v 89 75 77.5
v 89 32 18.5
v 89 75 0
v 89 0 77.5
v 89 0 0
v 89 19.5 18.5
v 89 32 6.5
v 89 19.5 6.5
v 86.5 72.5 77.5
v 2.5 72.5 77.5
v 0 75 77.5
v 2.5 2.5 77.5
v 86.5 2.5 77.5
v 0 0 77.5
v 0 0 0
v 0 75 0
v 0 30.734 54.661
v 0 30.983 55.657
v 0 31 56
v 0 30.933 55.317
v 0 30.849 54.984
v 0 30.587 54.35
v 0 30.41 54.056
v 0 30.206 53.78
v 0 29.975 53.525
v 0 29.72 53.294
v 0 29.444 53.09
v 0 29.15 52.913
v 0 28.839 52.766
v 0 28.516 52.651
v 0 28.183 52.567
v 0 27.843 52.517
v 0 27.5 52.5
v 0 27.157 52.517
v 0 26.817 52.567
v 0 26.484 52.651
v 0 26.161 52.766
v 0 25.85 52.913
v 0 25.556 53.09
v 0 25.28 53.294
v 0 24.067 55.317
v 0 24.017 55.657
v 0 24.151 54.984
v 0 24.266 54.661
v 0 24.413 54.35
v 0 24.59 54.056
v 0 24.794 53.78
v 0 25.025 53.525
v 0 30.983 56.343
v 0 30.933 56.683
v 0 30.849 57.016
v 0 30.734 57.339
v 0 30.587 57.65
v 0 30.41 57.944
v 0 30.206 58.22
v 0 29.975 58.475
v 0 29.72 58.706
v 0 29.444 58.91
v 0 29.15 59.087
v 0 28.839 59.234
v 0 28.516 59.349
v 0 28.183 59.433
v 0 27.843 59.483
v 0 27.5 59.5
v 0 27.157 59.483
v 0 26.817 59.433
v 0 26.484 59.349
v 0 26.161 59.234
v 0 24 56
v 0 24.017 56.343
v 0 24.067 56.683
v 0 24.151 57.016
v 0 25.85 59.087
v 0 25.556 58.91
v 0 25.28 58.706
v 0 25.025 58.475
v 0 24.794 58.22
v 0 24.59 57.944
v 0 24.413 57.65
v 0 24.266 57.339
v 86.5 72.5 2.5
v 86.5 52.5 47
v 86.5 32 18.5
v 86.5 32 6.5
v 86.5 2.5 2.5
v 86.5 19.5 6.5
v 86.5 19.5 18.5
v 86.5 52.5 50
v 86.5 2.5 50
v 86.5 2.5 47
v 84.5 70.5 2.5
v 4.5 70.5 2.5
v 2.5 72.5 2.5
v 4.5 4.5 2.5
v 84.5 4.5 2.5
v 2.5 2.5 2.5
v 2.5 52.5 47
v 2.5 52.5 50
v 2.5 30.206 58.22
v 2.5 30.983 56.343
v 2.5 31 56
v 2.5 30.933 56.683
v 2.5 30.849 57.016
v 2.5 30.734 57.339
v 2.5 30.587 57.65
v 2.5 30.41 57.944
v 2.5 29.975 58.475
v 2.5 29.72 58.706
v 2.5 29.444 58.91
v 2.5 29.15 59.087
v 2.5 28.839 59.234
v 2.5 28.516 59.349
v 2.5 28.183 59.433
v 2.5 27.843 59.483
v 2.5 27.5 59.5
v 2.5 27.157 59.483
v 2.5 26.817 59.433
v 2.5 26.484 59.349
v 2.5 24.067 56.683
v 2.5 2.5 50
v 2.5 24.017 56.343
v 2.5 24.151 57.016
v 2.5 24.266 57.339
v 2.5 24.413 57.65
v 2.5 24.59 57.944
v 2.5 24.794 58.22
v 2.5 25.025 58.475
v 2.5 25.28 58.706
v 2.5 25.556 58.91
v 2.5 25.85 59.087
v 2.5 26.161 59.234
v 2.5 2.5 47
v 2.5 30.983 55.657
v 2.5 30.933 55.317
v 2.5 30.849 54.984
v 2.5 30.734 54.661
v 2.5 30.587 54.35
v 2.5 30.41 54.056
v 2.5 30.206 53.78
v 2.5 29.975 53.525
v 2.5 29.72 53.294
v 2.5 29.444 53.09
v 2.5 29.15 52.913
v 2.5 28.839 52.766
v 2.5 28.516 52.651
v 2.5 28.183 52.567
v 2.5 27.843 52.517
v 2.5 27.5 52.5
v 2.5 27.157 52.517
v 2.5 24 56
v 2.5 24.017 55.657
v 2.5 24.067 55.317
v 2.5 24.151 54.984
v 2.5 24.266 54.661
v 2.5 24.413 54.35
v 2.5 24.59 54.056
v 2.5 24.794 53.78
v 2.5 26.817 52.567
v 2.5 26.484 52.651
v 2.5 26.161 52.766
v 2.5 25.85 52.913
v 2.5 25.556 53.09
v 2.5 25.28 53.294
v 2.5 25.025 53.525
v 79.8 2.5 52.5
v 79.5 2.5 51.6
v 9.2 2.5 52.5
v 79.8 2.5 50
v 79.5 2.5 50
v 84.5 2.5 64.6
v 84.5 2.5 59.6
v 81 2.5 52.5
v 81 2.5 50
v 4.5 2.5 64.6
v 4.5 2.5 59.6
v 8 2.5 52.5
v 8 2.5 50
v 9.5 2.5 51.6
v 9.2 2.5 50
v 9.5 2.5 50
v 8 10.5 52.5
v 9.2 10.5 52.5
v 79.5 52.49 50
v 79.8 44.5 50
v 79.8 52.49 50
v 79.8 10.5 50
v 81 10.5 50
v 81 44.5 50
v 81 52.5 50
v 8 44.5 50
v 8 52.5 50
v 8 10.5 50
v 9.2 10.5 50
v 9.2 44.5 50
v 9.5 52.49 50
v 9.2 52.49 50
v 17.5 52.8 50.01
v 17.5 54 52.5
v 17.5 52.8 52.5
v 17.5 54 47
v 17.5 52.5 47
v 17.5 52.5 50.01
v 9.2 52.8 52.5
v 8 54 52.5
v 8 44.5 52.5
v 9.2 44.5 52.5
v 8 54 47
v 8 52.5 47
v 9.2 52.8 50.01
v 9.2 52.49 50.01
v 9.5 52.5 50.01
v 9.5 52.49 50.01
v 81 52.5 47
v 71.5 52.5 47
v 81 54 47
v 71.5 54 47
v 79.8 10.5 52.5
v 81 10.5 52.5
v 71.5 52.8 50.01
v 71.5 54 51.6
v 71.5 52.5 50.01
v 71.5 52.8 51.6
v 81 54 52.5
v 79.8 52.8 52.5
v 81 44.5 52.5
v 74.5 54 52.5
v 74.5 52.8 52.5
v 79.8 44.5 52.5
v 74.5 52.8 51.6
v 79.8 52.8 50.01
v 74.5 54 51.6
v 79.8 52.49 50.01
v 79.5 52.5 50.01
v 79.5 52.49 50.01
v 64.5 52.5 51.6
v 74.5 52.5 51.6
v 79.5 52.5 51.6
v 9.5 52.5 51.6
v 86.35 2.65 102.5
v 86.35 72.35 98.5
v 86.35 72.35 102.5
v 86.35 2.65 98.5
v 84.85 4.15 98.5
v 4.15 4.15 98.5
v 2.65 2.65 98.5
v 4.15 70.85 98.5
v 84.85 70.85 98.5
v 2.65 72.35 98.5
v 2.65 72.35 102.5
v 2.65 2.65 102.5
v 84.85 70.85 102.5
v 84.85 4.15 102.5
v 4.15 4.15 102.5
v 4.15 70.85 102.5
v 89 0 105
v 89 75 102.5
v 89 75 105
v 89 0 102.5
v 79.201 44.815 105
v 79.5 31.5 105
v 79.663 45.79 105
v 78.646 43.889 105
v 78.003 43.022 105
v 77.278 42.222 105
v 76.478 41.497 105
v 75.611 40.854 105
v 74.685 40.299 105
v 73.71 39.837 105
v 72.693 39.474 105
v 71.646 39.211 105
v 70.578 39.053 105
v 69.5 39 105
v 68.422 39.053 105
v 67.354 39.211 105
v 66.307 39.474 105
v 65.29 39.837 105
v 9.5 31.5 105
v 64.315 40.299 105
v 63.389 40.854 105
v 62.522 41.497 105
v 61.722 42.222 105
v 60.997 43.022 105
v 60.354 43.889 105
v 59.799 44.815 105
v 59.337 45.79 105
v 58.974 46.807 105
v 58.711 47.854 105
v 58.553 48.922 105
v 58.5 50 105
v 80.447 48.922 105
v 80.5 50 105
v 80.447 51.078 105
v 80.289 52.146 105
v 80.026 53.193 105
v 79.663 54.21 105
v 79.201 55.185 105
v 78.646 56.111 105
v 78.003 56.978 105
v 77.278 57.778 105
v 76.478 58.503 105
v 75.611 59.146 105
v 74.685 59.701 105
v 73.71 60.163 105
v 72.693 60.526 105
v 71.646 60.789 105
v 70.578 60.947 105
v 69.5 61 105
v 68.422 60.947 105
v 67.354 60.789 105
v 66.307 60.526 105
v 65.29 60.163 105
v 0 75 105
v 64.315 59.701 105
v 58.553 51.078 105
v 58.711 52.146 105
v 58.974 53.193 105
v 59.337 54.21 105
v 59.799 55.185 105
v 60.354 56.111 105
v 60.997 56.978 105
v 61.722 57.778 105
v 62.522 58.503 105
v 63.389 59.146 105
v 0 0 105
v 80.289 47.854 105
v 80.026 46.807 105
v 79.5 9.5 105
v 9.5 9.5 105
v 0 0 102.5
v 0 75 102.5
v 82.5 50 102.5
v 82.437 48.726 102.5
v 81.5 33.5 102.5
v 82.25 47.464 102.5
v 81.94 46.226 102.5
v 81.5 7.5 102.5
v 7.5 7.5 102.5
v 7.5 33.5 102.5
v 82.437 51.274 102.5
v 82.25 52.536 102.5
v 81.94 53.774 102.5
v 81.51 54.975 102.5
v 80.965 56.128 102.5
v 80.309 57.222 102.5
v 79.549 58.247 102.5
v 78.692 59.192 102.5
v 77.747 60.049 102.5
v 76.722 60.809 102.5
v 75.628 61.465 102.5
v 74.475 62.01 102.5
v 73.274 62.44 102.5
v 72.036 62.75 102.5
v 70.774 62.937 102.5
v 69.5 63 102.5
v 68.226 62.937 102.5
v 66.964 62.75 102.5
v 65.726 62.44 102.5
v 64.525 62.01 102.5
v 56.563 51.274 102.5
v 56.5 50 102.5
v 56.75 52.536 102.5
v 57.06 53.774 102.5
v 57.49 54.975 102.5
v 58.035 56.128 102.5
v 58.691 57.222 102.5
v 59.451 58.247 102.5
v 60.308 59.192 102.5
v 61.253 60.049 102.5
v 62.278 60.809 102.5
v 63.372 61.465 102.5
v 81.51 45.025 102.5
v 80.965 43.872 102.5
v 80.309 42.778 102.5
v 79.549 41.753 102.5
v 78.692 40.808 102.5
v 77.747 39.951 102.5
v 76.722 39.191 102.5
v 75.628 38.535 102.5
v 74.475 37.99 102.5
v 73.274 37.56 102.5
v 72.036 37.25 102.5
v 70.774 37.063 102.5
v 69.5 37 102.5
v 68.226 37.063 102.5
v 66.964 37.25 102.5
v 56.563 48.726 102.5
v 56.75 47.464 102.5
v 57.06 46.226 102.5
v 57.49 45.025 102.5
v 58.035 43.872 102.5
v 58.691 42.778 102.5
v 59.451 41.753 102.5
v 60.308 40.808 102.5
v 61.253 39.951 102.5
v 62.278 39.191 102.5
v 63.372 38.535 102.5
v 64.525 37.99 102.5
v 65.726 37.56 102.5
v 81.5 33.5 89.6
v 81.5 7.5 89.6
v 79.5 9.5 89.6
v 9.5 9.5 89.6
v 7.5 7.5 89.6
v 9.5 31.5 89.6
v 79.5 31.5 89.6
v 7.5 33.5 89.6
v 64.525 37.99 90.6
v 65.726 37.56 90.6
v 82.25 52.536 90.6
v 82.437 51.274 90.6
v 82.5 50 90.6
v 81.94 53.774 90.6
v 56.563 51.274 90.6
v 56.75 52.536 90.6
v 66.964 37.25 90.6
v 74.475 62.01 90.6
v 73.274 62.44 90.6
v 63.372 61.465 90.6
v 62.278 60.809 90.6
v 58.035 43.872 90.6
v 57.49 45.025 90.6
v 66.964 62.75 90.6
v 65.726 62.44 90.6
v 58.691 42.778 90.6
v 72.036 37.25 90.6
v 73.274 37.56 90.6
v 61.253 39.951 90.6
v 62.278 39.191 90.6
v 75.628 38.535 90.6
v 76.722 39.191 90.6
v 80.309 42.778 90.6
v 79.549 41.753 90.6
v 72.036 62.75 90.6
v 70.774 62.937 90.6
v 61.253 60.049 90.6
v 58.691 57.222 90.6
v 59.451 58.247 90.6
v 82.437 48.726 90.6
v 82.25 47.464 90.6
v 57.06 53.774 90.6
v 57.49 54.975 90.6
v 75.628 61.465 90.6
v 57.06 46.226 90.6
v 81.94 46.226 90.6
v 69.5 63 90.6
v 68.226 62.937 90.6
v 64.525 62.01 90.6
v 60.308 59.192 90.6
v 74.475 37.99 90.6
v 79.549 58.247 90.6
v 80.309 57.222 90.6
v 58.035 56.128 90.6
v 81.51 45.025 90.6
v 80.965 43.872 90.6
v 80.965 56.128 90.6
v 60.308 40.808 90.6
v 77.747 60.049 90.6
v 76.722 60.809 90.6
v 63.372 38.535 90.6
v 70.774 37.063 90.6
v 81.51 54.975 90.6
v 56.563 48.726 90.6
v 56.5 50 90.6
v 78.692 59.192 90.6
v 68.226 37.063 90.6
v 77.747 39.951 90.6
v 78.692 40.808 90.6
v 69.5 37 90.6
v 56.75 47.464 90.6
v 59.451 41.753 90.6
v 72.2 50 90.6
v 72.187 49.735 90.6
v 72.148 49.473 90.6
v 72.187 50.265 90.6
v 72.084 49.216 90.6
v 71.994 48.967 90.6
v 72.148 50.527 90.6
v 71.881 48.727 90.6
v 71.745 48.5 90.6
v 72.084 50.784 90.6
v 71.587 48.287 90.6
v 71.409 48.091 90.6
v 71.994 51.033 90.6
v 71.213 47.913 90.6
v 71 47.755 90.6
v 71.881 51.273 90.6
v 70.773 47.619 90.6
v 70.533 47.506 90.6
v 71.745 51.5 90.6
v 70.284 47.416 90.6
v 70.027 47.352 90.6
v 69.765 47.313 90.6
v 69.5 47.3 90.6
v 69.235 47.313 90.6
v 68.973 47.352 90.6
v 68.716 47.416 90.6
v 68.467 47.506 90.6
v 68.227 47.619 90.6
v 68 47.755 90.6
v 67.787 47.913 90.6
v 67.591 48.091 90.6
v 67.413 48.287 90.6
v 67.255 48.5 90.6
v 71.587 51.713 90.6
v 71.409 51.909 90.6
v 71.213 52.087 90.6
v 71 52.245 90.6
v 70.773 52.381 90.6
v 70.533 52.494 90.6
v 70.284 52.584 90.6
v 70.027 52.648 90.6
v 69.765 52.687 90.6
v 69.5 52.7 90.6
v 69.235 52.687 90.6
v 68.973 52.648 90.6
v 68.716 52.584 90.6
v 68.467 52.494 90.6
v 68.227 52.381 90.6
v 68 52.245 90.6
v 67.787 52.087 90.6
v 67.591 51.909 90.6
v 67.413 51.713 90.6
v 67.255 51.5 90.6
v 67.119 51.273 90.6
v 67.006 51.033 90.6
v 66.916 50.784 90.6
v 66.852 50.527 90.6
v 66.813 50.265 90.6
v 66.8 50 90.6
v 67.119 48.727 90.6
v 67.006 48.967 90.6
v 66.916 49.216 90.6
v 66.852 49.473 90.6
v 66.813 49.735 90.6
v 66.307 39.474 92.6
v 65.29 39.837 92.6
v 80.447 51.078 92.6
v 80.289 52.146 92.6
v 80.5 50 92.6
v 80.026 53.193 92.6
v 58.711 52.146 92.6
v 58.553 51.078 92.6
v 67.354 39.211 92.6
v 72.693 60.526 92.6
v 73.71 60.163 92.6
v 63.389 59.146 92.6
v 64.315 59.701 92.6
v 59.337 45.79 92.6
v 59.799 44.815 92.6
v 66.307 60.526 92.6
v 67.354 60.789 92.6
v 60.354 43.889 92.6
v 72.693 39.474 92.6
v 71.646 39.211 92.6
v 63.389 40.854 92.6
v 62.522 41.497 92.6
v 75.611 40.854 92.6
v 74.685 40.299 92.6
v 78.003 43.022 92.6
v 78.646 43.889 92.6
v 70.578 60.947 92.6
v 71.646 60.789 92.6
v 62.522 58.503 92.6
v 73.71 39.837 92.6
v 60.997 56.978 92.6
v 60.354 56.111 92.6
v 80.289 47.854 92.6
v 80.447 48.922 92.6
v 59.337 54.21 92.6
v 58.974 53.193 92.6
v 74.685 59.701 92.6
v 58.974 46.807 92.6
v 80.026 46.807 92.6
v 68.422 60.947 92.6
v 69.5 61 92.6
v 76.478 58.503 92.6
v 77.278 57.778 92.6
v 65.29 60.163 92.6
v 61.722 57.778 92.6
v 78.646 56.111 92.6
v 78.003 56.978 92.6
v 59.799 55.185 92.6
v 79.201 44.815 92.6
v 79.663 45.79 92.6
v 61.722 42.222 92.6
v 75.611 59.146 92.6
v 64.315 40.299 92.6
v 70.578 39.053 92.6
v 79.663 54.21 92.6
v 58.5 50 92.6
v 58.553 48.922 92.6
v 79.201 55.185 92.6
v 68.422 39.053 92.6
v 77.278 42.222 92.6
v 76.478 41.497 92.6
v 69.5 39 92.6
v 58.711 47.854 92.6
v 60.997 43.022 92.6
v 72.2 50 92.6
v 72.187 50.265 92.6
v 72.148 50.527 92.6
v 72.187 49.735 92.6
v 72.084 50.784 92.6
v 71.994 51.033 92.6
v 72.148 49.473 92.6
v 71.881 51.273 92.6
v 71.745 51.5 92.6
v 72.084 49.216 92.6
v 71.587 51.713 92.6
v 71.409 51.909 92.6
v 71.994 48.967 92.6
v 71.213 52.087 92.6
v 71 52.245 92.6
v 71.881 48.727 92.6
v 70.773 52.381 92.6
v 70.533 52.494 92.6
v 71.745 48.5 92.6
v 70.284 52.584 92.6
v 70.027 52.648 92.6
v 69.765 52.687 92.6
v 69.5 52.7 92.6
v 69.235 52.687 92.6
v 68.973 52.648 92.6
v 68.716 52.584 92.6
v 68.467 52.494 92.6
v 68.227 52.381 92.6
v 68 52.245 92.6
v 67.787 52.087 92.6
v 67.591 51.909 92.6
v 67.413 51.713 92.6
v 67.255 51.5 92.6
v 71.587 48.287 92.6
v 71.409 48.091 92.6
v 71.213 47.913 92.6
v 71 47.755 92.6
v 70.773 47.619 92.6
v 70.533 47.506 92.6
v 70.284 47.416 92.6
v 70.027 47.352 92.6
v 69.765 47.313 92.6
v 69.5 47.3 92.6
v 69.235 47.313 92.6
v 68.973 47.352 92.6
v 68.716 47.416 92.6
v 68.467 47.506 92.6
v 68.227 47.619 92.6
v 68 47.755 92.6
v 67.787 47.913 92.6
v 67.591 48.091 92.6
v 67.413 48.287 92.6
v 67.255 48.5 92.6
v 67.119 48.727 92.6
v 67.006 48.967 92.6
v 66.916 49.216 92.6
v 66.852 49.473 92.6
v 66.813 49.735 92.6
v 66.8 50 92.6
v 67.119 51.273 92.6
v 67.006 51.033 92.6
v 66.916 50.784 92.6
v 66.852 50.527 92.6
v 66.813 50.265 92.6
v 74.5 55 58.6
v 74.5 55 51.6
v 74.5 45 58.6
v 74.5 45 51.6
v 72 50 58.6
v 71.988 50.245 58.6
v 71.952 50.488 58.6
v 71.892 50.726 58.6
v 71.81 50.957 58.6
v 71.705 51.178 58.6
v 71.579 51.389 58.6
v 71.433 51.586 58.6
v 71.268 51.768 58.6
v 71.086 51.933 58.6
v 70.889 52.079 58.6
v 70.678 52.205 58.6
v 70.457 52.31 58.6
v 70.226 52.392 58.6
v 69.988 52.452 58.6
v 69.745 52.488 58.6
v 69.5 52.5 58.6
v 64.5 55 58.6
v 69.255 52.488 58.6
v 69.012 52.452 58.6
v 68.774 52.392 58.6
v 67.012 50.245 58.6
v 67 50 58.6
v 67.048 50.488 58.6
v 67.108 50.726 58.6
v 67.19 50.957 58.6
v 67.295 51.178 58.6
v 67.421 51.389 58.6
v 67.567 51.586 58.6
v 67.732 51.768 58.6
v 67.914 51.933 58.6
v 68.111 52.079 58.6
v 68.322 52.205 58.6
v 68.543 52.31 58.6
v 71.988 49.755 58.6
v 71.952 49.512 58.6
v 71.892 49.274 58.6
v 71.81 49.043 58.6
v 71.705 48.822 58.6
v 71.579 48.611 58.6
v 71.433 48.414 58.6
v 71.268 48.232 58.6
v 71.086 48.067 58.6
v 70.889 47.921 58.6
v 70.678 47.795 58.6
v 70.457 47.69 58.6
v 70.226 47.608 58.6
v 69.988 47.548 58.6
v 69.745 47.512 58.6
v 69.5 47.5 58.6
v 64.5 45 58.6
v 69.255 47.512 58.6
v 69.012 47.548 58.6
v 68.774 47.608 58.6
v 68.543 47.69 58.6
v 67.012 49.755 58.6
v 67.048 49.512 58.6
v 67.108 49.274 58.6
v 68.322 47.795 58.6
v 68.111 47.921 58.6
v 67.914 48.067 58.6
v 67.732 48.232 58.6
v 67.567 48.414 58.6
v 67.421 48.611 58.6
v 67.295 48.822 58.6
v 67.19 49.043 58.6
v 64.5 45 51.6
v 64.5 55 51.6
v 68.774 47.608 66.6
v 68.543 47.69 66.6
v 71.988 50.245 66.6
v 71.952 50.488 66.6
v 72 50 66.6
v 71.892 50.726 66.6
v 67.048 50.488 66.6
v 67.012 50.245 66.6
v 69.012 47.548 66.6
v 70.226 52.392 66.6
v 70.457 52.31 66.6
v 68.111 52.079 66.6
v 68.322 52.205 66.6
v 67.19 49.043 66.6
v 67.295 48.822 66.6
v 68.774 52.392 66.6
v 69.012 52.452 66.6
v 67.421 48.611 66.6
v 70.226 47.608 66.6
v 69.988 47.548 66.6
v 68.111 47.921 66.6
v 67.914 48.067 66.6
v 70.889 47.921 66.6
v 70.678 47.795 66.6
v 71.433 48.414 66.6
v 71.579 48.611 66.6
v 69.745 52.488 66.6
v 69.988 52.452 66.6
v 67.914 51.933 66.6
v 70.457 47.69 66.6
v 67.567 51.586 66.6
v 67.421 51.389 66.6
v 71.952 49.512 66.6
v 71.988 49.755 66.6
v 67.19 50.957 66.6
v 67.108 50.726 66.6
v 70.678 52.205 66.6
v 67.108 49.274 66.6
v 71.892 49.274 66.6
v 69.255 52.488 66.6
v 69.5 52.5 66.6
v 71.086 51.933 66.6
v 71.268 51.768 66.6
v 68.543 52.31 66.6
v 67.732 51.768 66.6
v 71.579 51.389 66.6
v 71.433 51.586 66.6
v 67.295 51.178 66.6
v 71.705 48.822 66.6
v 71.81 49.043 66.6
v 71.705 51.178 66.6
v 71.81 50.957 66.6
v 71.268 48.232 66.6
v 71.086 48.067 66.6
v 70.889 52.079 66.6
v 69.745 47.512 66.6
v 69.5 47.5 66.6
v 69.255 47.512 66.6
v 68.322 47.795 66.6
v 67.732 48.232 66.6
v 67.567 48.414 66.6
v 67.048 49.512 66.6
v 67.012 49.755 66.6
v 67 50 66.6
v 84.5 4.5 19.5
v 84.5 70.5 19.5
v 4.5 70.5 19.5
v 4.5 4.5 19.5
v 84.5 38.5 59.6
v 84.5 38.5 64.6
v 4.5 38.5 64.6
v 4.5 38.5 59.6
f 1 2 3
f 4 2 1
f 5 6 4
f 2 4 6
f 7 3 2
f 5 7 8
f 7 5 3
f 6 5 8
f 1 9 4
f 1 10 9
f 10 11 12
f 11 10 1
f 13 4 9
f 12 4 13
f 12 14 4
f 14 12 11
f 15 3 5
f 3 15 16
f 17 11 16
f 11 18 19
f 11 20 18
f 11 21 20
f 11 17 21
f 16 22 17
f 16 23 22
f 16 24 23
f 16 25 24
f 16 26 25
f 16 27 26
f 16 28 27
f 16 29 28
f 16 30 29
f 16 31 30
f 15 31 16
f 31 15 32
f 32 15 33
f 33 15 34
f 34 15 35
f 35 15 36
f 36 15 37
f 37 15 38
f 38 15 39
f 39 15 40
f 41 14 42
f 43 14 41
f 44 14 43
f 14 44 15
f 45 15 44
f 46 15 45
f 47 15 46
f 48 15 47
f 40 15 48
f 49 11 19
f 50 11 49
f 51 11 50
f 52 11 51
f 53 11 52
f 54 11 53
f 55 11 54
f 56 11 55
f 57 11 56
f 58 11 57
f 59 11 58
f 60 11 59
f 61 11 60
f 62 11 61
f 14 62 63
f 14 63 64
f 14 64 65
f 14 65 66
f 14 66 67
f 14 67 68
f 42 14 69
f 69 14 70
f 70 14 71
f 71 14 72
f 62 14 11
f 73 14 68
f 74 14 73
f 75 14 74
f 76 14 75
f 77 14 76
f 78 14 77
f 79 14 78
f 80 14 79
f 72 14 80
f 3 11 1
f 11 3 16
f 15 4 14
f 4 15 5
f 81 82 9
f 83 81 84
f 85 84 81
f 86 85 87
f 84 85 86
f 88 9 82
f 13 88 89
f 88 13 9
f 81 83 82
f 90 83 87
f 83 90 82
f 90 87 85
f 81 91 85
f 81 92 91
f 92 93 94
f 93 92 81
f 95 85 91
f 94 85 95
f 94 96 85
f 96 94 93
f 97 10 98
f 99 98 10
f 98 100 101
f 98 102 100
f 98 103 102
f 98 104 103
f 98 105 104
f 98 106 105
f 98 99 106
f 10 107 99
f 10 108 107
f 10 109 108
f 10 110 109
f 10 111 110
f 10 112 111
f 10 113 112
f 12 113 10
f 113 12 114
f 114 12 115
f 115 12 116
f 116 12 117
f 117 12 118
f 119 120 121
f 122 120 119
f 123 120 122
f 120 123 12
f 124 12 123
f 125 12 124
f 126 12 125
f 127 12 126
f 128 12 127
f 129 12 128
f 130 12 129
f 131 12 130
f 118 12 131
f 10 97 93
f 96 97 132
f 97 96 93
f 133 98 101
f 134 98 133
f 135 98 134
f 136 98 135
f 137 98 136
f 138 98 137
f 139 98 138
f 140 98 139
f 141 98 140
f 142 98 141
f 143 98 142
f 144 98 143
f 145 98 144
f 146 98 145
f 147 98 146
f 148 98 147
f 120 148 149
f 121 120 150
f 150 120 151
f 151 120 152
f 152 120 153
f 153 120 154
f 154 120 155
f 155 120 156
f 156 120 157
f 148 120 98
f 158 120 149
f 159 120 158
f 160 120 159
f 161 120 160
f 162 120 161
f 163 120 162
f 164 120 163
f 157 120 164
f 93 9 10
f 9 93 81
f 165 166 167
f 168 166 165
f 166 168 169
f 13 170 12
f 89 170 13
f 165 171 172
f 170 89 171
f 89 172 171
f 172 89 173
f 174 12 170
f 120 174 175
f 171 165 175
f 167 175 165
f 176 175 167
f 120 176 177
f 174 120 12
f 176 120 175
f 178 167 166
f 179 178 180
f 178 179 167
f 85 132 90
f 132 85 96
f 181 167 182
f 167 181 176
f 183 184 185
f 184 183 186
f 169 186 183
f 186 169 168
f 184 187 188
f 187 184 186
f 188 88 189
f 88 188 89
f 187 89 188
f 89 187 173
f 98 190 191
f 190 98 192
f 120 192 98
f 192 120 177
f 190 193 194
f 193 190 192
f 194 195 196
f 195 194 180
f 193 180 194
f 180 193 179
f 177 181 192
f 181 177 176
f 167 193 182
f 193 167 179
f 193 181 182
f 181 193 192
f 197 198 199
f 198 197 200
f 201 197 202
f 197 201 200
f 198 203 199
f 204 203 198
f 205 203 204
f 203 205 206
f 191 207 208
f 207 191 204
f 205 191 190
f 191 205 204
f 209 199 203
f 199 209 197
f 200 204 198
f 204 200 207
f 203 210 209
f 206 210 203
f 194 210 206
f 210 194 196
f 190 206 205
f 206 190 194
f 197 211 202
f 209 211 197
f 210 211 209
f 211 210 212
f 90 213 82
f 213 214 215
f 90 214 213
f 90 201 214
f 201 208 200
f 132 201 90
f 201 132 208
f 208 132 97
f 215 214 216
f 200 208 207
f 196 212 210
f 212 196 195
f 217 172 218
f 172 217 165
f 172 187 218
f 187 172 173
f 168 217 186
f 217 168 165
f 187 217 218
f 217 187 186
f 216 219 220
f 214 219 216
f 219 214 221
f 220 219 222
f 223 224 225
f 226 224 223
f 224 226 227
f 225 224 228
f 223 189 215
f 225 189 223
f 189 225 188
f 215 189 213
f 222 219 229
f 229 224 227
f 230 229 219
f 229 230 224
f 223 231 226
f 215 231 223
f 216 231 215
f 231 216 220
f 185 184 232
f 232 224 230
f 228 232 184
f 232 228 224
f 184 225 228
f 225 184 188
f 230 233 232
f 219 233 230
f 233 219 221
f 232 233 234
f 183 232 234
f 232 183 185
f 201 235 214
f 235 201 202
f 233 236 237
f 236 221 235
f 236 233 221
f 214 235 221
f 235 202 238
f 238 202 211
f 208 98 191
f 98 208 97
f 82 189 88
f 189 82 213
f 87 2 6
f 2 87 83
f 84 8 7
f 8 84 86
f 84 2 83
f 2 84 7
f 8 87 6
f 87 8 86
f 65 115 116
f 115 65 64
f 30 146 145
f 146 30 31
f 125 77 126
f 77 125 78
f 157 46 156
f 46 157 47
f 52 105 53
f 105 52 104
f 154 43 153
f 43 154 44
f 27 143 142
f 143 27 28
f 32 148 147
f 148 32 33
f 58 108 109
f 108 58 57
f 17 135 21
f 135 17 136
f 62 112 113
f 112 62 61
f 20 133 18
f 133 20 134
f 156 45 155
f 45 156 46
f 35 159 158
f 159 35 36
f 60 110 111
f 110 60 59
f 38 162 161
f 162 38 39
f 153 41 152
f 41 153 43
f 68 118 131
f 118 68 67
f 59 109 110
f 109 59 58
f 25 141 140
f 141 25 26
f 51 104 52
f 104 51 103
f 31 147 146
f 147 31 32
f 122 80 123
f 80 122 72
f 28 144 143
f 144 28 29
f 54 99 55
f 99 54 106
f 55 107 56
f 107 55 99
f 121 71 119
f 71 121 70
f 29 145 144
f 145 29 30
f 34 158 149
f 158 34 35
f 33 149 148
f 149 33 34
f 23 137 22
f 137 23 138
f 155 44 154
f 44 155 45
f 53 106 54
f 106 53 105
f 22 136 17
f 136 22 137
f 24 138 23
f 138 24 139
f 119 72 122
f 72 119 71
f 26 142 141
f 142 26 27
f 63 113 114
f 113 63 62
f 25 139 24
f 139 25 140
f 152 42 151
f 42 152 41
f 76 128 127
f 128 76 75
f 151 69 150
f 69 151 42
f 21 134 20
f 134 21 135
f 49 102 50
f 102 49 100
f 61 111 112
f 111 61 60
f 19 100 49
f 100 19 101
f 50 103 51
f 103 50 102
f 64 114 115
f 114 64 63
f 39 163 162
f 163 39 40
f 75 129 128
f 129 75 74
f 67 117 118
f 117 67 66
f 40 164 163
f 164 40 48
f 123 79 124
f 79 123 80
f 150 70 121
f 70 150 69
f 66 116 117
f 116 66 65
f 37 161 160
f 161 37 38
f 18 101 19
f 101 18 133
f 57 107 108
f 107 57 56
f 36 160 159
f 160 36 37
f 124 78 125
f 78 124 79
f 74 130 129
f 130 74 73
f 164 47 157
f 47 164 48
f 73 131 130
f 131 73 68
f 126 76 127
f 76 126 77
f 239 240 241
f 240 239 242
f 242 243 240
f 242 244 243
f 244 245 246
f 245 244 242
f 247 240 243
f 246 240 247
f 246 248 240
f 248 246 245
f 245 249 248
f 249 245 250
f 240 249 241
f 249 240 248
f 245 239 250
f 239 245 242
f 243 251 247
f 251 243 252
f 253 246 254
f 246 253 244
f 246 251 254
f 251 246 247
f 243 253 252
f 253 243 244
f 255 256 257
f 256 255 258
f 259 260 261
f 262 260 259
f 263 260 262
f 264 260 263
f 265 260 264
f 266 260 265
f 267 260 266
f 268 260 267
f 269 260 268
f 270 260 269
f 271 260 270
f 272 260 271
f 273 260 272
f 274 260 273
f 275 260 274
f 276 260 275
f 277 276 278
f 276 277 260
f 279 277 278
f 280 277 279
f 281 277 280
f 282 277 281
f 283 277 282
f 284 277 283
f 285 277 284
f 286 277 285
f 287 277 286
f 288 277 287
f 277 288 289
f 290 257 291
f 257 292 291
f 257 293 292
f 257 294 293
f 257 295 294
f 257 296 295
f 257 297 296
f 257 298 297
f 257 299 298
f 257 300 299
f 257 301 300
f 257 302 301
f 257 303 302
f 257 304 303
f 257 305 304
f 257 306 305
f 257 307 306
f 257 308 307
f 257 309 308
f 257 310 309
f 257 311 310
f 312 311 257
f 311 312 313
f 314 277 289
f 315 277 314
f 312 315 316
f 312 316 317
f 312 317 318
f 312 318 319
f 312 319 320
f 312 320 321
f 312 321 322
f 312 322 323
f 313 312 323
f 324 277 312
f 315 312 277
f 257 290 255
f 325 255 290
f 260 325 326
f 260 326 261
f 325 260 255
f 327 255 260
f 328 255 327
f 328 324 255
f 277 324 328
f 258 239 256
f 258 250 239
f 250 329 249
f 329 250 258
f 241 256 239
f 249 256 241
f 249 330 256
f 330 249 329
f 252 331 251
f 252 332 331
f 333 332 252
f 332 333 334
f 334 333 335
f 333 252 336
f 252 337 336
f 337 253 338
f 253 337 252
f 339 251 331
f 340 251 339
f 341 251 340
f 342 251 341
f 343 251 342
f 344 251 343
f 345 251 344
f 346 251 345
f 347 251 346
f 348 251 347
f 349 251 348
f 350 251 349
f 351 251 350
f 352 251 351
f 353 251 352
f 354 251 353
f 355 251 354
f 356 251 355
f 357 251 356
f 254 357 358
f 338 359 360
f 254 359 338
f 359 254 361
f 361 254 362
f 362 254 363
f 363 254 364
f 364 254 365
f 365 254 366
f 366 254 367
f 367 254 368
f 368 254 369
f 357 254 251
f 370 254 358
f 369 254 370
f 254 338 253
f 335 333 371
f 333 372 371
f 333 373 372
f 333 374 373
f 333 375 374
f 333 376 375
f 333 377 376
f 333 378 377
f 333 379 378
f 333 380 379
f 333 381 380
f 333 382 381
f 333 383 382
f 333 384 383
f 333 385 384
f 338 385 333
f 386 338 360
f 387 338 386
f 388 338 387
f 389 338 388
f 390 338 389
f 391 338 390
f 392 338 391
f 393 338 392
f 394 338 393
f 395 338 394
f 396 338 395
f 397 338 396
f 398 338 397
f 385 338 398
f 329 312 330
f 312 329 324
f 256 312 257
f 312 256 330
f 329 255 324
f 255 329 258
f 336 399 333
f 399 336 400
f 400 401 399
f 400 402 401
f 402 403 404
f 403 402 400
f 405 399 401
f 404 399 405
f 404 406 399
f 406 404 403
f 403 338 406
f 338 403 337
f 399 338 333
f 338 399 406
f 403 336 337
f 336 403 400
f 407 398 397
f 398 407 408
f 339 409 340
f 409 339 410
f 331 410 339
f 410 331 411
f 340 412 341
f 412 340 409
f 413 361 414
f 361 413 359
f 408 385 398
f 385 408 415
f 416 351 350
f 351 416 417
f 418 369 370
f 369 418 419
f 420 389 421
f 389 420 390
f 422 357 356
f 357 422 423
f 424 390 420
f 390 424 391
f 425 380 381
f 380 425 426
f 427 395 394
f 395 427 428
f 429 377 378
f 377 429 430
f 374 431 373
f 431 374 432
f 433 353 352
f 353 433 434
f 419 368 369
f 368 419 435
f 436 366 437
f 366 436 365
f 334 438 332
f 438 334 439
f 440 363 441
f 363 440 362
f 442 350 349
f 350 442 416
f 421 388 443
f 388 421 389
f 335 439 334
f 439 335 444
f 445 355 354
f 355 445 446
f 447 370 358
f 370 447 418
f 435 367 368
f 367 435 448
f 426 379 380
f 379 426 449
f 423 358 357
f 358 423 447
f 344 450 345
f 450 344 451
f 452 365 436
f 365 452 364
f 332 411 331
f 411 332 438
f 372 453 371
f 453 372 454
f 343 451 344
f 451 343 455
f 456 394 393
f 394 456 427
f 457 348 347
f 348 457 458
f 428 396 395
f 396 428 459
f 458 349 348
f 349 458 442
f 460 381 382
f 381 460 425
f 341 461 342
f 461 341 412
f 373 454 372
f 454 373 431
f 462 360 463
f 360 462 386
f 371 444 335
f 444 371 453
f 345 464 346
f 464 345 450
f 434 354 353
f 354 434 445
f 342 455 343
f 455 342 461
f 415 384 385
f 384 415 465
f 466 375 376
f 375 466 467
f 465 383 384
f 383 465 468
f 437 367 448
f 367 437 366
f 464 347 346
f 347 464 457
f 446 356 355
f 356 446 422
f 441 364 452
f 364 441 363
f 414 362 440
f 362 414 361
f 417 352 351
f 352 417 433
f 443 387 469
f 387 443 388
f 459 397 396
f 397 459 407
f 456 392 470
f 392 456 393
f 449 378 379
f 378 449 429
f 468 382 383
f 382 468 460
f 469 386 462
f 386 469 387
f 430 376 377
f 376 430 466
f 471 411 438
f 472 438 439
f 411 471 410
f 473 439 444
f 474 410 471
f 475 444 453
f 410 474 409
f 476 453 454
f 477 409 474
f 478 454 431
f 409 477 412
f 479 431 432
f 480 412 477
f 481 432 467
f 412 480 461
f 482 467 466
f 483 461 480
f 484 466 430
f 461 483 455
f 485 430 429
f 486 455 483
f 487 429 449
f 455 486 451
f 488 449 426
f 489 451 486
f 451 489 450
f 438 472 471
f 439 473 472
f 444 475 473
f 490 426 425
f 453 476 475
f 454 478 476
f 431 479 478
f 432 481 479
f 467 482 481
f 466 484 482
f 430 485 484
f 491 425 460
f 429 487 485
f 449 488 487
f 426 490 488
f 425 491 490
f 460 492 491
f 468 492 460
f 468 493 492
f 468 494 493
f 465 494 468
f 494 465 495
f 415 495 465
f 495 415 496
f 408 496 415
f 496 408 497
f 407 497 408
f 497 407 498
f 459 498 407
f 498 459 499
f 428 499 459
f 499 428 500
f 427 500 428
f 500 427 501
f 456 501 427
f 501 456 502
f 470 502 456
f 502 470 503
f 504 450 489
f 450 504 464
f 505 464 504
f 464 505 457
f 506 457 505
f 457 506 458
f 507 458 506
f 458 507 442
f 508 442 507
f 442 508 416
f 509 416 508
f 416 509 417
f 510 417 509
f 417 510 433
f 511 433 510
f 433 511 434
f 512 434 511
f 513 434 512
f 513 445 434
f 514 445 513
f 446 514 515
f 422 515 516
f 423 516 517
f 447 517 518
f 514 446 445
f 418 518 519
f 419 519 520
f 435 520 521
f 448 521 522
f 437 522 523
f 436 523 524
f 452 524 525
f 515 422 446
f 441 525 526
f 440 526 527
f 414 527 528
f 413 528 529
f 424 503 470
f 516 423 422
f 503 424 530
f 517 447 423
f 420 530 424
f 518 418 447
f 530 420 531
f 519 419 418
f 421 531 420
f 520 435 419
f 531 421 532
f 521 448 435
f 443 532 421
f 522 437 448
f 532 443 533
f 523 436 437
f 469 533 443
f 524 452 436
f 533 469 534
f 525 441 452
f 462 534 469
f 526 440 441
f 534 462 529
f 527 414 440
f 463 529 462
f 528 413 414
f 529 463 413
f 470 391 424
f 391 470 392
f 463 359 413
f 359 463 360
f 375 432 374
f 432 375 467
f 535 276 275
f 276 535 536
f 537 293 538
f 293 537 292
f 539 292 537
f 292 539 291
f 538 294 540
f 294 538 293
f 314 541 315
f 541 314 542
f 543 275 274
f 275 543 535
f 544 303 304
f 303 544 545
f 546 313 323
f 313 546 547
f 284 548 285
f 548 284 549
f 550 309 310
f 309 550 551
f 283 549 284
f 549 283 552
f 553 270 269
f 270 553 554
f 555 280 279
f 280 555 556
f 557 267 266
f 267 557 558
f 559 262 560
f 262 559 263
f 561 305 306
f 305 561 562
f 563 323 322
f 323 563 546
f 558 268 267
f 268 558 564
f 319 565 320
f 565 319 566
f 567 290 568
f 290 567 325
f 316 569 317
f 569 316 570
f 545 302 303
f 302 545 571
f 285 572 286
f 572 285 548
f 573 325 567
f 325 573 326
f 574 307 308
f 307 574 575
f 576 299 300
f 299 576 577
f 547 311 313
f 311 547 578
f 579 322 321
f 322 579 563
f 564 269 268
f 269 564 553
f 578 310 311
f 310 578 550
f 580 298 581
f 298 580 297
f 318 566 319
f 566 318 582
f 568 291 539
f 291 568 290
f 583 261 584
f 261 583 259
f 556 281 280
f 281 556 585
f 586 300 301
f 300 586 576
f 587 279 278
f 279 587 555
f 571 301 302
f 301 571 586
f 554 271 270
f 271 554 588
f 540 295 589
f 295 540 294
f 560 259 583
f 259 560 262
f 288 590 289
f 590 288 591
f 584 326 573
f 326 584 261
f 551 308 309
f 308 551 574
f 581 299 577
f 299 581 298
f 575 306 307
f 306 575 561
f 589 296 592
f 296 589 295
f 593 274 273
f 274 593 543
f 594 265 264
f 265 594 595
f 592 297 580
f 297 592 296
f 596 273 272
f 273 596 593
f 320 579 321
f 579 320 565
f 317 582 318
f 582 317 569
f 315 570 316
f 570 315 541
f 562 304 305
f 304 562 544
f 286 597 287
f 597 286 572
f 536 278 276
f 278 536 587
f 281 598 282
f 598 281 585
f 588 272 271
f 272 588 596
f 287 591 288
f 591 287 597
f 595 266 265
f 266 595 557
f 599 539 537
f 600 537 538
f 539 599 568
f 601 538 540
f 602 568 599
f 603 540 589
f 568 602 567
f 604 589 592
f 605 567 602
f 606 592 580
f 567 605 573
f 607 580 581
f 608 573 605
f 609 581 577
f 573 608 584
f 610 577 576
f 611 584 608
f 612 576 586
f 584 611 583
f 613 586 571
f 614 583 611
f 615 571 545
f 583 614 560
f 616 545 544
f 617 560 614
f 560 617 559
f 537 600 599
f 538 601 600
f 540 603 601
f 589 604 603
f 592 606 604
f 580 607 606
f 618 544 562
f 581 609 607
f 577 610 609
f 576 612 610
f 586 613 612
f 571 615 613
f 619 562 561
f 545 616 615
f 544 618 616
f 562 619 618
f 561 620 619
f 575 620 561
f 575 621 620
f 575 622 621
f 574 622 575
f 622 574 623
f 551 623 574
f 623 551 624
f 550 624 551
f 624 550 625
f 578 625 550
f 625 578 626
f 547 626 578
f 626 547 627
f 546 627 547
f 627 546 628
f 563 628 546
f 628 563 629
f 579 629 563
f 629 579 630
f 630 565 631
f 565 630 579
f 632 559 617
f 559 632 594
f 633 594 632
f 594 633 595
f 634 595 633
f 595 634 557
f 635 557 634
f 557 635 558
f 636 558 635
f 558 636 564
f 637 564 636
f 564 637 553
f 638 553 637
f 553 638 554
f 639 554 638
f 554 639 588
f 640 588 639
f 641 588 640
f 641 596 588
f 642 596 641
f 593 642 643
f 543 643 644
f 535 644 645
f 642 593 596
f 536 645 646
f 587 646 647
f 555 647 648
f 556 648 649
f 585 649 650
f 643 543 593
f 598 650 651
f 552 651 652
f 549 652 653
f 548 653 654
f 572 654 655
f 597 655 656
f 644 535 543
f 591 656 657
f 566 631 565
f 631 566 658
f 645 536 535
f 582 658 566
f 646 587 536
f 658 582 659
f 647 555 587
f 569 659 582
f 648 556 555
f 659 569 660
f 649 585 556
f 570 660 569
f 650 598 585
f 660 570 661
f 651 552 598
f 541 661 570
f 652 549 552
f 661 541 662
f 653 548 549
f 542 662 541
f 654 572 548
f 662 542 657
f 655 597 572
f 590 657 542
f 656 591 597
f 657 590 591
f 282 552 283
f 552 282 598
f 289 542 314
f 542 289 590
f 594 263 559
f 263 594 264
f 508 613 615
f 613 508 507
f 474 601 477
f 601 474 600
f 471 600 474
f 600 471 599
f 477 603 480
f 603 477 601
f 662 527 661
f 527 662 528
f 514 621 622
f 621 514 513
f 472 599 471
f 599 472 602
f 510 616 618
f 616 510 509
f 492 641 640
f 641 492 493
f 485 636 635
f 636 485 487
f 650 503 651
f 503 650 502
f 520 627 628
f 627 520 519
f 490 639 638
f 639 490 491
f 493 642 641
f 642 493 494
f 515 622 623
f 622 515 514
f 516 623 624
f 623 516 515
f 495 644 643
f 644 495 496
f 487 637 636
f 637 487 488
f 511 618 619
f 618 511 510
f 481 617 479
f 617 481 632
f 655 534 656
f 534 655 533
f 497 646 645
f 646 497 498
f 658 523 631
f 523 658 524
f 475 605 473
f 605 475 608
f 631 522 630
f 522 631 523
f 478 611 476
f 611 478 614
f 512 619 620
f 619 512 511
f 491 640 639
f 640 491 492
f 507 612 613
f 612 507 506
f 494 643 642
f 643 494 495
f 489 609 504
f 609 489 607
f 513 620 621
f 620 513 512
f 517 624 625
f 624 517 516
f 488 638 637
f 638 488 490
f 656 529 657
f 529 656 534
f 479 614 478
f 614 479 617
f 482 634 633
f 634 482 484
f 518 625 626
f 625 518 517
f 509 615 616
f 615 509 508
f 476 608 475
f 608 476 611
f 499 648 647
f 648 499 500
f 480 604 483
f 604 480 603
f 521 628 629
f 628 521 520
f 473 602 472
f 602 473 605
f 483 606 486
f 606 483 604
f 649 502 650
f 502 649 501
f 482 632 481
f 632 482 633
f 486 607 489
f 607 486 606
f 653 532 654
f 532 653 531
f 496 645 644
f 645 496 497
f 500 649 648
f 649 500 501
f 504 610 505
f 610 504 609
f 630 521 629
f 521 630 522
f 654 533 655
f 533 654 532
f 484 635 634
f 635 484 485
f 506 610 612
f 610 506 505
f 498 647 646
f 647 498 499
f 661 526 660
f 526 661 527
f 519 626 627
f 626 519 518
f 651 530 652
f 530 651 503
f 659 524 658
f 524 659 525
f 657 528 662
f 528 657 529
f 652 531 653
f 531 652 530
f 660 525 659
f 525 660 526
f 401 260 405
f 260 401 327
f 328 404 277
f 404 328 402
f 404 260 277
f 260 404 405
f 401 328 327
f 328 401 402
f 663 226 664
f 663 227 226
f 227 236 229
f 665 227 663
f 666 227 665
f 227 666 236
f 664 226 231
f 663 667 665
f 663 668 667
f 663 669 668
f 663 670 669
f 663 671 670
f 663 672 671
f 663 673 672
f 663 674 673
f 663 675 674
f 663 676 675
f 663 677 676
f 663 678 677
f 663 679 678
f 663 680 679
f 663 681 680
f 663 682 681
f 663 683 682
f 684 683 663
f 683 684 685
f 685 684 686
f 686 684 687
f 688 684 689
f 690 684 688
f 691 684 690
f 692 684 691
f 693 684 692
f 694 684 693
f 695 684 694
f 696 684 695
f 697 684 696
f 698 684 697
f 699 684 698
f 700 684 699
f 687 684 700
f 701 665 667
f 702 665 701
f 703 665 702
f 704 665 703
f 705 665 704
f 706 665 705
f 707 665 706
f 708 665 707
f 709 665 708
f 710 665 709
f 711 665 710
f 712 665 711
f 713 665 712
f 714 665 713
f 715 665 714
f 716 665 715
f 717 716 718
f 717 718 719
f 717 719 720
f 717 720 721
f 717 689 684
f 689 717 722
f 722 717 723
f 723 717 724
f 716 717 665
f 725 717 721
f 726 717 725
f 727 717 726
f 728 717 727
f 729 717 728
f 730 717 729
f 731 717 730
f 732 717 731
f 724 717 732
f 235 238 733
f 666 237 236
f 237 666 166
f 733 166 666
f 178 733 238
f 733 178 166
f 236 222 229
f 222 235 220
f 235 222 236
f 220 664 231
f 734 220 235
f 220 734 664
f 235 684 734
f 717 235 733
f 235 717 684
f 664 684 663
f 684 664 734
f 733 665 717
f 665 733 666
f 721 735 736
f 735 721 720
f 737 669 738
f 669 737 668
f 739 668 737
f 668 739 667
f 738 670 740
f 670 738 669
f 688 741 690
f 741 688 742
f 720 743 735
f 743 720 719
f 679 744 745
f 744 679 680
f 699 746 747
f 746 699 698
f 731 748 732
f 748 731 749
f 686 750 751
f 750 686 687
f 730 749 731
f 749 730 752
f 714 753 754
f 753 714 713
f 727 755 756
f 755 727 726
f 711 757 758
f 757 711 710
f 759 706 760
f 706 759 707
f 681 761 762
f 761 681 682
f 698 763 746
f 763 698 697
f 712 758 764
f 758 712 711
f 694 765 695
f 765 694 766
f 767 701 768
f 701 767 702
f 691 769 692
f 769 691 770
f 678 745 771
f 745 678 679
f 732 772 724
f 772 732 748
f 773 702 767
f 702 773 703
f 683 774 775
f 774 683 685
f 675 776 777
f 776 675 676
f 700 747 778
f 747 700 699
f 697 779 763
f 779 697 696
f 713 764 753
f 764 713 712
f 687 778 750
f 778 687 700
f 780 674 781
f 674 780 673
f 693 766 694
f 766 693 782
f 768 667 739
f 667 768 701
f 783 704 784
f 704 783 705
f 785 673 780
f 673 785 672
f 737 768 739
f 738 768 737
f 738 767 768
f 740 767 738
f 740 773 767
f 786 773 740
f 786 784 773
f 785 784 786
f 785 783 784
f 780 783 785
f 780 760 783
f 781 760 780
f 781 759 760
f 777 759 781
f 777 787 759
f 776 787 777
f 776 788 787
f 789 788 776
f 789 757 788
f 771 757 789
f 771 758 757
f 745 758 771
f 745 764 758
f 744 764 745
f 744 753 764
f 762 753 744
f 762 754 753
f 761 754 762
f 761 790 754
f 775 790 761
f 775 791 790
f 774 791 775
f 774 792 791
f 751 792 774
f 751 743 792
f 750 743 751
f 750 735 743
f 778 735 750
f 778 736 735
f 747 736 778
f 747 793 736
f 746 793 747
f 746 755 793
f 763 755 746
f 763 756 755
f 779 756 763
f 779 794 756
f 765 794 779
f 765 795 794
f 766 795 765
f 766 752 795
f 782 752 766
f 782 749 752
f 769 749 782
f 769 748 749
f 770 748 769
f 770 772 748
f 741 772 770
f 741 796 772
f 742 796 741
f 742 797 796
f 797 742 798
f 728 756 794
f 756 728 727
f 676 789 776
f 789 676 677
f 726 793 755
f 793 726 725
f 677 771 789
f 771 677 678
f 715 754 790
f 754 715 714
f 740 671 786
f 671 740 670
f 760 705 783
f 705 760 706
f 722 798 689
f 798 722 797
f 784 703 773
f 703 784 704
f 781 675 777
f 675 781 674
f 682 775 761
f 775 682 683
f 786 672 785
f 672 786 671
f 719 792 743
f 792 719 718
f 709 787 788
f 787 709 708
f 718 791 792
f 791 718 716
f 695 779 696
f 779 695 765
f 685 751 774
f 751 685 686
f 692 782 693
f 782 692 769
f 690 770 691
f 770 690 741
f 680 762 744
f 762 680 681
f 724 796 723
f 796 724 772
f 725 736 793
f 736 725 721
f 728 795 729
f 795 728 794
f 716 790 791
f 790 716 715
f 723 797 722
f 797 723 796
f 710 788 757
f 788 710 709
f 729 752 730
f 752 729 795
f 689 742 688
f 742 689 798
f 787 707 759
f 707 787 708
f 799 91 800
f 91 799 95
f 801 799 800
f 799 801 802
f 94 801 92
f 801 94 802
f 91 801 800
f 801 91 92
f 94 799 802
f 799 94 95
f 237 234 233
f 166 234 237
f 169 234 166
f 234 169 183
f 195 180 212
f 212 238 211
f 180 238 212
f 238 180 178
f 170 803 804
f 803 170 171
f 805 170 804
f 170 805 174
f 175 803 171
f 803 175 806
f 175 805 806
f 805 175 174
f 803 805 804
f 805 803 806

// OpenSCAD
// =====================================================================
//  PT100 THERMOMETER ENCLOSURE - single-file OpenSCAD design
//  All lengths in mm.
//  Origin (0,0,0) = outer bottom corner on the shelf side.
//  +x = 84 mm length (USB end at +x), +y = width, +z = up.
//  y-values given for shelf / perfboard / pot / PT100 hole are measured
//  from the INNER y=0 wall (shelf side).
// =====================================================================

/* ---------------- SELECTOR ---------------- */
part = "assembly";      // "assembly" | "base" | "lid" | "print_layout"
                        // ("lid" shows the lid flipped, ready to print)

/* ---------------- GENERAL ---------------- */
$fn = 64;
tol = 0.3;              // print clearance
eps = 0.01;             // tiny overlap for clean boolean ops
asm_lid_lift = 25;      // how far the lid is lifted in "assembly"
show_ghosts = true;     // ghost parts in "assembly"
layout_gap = 15;        // gap between base and lid in "print_layout"

/* ---------------- ARDUINO (in acrylic case) ---------------- */
ard_l = 80;             // along x
ard_w = 66;             // along y
ard_h = 17;
ard_gap = 2;            // clearance to every wall

/* ---------------- PERFBOARD ---------------- */
pcb_l = 70;             // along x
pcb_w = 50;             // along y
pcb_t = 1.6;
pcb_x_off = 7;          // from inner end wall (x=0 side)
pcb_y_off = 0;          // 0 = flush with inner wall on shelf side

/* ---------------- LCD 16x2 ---------------- */
lcd_l = 80;             // along x (overhangs perfboard 5 mm each end)
lcd_w = 36;             // along y
lcd_h = 13;             // CONFIRM: LCD top (bezel) above perfboard top
lcd_body_t = 5;         // CONFIRM: LCD thickness (ghost preview only)

/* ---------------- POTENTIOMETER ---------------- */
pot_shaft_d = 5;        // hole/shaft diameter
pot_y_on_pcb = 47.5;    // along the 50 mm side (45..50 range, centre 47.5)
pot_x_on_pcb = 60;      // CONFIRM: from perfboard end (x low end)
pot_shaft_h = 15;       // CONFIRM: shaft top above perfboard top
pot_body_xy = 10;       // CONFIRM: ghost body footprint (preview only)
pot_body_h = 7;         // CONFIRM: ghost body height (preview only)

/* ---------------- BOX ---------------- */
wall = 2.5;
floor_t = 2.5;
lid_t = 2.5;
out_z = 80;             // total outside height

/* ---------------- SHELF ---------------- */
shelf_t = 3;
shelf_top = 50;         // top surface height (5 cm)
shelf_depth = 50;       // from inner y=0 wall; strip beyond stays open

/* ---------------- PERFBOARD LUGS (4x, L-shaped) ---------------- */
lug_t = 1.2;            // lug thickness
lug_h = 2.5;            // lug height above shelf top
lug_clear = tol;        // clearance to perfboard edge
lug_len = 8;            // CONFIRM: length of each L leg

/* ---------------- LID FIXING: FRICTION-FIT LIP (no screws) ---------------- */
lip_h = 4;              // CONFIRM: how deep the lip goes into the box
lip_t = 1.5;            // lip wall thickness
lip_clear = 0.15;       // CONFIRM: gap per side. Tight? raise to 0.2-0.25. Loose? lower to 0.1

/* ---------------- LCD WINDOW + COLLAR ---------------- */
win_l = 70;             // window along x
win_w = 22;             // window along y
col_l = 74;             // collar outer along x
col_w = 26;             // collar outer along y

/* ---------------- POT HOLE / WELL IN LID ---------------- */
pot_hole_lid_d = 5.4;   // through-hole in lid / well floor
well_d = 22;            // recess width
well_wall = 2;          // CONFIRM: wall of the cup that hangs below the lid
well_floor_t = 2;       // CONFIRM: floor thickness of the well
well_floor_above_shaft = 1;  // CONFIRM: well floor TOP is this far above shaft top
                             // (use a negative value if the shaft should poke through)

/* ---------------- CUTOUTS ---------------- */
// USB (+x end wall)
usb_w = 12;
usb_tol = 0.5;          // added to width
usb_h = 12;
usb_from_ard_left = 15; // left edge, seen from outside (low-y side)
usb_z = 6.5;            // CONFIRM: bottom of cutout

// Power jack (+x end wall) - OFF by default
jack_enable = false;
jack_w = 9;             // CONFIRM
jack_tol = 0.5;
jack_h = 11;            // CONFIRM
jack_from_ard_left = 40;// CONFIRM: left edge from Arduino left edge
jack_z = 6.5;           // CONFIRM: bottom of cutout

// PT100 cable hole (x = 0 end wall)
pt100_d = 7;           // 0.7 cm
pt100_y = 25;           // CONFIRM: from inner y=0 wall
pt100_z = 56;           // CONFIRM

// =====================================================================
//  DERIVED VALUES (do not edit)
// =====================================================================
in_x = ard_l + 2*ard_gap;              // 84
in_y = ard_w + 2*ard_gap;              // 70
in_z = out_z - floor_t - lid_t;        // 75
out_x = in_x + 2*wall;                 // 89
out_y = in_y + 2*wall;                 // 75
lid_z0 = out_z - lid_t;                // lid underside = top of walls

ard_x0 = wall + ard_gap;
ard_y0 = wall + ard_gap;

pcb_x0 = wall + pcb_x_off;
pcb_y0 = wall + pcb_y_off;
pcb_top = shelf_top + pcb_t;

lcd_x0 = pcb_x0 + (pcb_l - lcd_l)/2;
lcd_y0 = pcb_y0;
lcd_top_z = pcb_top + lcd_h;
lcd_cx = lcd_x0 + lcd_l/2;
lcd_cy = lcd_y0 + lcd_w/2;

pot_x = pcb_x0 + pot_x_on_pcb;
pot_y = pcb_y0 + pot_y_on_pcb;
pot_top_z = pcb_top + pot_shaft_h;

use_well = pot_top_z < lid_z0;
well_floor_top = pot_top_z + well_floor_above_shaft;
well_floor_bot = well_floor_top - well_floor_t;

// =====================================================================
//  BASE
// =====================================================================
module box_shell() {
    difference() {
        cube([out_x, out_y, lid_z0]);
        translate([wall, wall, floor_t]) cube([in_x, in_y, lid_z0]);
    }
}

module shelf() {
    // spans full inner length, from inner y=0 wall to shelf_depth; strip beyond is open
    translate([wall - 0.5, wall - 0.5, shelf_top - shelf_t])
        cube([in_x + 1, shelf_depth + 0.5, shelf_t]);
}

// one L-shaped lug, perfboard corner at local (0,0), board toward +x,+y
module lug_local(far) {
    translate([-lug_clear - lug_t, -lug_clear - lug_t, 0])
        cube([lug_t + lug_clear + lug_len, lug_t, lug_h]);      // leg along x
    translate([-lug_clear - lug_t, -lug_clear - lug_t, 0])
        cube([lug_t, lug_t + lug_clear + lug_len, lug_h]);      // leg along y
    if (far)  // foot: continues the shelf edge so the lug is never floating
        translate([-lug_clear - lug_t, -lug_clear - lug_t, -shelf_t])
            cube([lug_t + lug_clear + lug_len, lug_t + lug_clear + eps, shelf_t + eps]);
}

module lugs() {
    for (ix=[0,1], iy=[0,1])
        translate([pcb_x0 + ix*pcb_l, pcb_y0 + iy*pcb_w, shelf_top])
            mirror([ix,0,0]) mirror([0,iy,0]) lug_local(iy==1);
}

module usb_cut() {
    translate([out_x - wall - 1, ard_y0 + usb_from_ard_left, usb_z])
        cube([wall + 2, usb_w + usb_tol, usb_h]);
}

module jack_cut() {
    translate([out_x - wall - 1, ard_y0 + jack_from_ard_left, jack_z])
        cube([wall + 2, jack_w + jack_tol, jack_h]);
}

module pt100_cut() {
    translate([-1, wall + pt100_y, pt100_z])
        rotate([0,90,0]) cylinder(d=pt100_d, h=wall + 2);
}

module base() {
    difference() {
        union() {
            box_shell();
            shelf();
            lugs();
        }
        usb_cut();
        if (jack_enable) jack_cut();
        pt100_cut();
    }
}

// =====================================================================
//  LID (modelled in its assembled position, underside at z = lid_z0)
// =====================================================================
module collar() {
    translate([lcd_cx - col_l/2, lcd_cy - col_w/2, lcd_top_z])
        cube([col_l, col_w, lid_z0 - lcd_top_z + 0.1]);
}

module well_tube() {
    translate([pot_x, pot_y, well_floor_bot])
        cylinder(d = well_d + 2*well_wall, h = lid_z0 - well_floor_bot + 0.1);
}

// friction lip: a rectangular ring that pushes into the box opening
module lid_lip() {
    translate([wall + lip_clear, wall + lip_clear, lid_z0 - lip_h])
        difference() {
            cube([in_x - 2*lip_clear, in_y - 2*lip_clear, lip_h + 0.1]);
            translate([lip_t, lip_t, -1])
                cube([in_x - 2*lip_clear - 2*lip_t,
                      in_y - 2*lip_clear - 2*lip_t, lip_h + 2]);
        }
}

module lid() {
    difference() {
        union() {
            translate([0,0,lid_z0]) cube([out_x, out_y, lid_t]);
            collar();
            lid_lip();
            if (use_well) well_tube();
        }
        // LCD window (also opens the collar)
        translate([lcd_cx - win_l/2, lcd_cy - win_w/2, lcd_top_z - 1])
            cube([win_l, win_w, out_z - lcd_top_z + 2]);
        // pot hole
        if (use_well) {
            translate([pot_x, pot_y, well_floor_top])
                cylinder(d=well_d, h=out_z - well_floor_top + 1);
            translate([pot_x, pot_y, well_floor_bot - 1])
                cylinder(d=pot_hole_lid_d, h=well_floor_t + 2);
        } else {
            translate([pot_x, pot_y, lid_z0 - 1])
                cylinder(d=pot_hole_lid_d, h=lid_t + 2);
        }
    }
}

// lid flipped (outer face on the bed), corner at origin
module lid_flipped() {
    translate([0, out_y, lid_t])
        rotate([180,0,0])
            translate([0,0,-lid_z0]) lid();
}

// =====================================================================
//  GHOST PARTS (fit check only)
// =====================================================================
module ghosts() {
    // Arduino in acrylic case
    color("lightskyblue", 0.30)
        translate([ard_x0, ard_y0, floor_t]) cube([ard_l, ard_w, ard_h]);
    // perfboard
    color("seagreen", 0.50)
        translate([pcb_x0, pcb_y0, shelf_top]) cube([pcb_l, pcb_w, pcb_t]);
    // LCD
    color("orange", 0.45)
        translate([lcd_x0, lcd_y0, lcd_top_z - lcd_body_t])
            cube([lcd_l, lcd_w, lcd_body_t]);
    // potentiometer
    color("crimson", 0.60) {
        translate([pot_x - pot_body_xy/2, pot_y - pot_body_xy/2, pcb_top])
            cube([pot_body_xy, pot_body_xy, pot_body_h]);
        translate([pot_x, pot_y, pcb_top])
            cylinder(d=pot_shaft_d, h=pot_shaft_h);
    }
}

// =====================================================================
//  OUTPUT
// =====================================================================
module assembly() {
    color("silver", 0.85) base();
    color("gainsboro", 0.85) translate([0,0,asm_lid_lift]) lid();
    if (show_ghosts) ghosts();
}

module print_layout() {
    base();
    translate([out_x + layout_gap, 0, 0]) lid_flipped();
}

if (part == "assembly")          assembly();
else if (part == "base")         base();
else if (part == "lid")          lid_flipped();
else if (part == "print_layout") print_layout();
else echo("Unknown part! Use assembly | base | lid | print_layout");
